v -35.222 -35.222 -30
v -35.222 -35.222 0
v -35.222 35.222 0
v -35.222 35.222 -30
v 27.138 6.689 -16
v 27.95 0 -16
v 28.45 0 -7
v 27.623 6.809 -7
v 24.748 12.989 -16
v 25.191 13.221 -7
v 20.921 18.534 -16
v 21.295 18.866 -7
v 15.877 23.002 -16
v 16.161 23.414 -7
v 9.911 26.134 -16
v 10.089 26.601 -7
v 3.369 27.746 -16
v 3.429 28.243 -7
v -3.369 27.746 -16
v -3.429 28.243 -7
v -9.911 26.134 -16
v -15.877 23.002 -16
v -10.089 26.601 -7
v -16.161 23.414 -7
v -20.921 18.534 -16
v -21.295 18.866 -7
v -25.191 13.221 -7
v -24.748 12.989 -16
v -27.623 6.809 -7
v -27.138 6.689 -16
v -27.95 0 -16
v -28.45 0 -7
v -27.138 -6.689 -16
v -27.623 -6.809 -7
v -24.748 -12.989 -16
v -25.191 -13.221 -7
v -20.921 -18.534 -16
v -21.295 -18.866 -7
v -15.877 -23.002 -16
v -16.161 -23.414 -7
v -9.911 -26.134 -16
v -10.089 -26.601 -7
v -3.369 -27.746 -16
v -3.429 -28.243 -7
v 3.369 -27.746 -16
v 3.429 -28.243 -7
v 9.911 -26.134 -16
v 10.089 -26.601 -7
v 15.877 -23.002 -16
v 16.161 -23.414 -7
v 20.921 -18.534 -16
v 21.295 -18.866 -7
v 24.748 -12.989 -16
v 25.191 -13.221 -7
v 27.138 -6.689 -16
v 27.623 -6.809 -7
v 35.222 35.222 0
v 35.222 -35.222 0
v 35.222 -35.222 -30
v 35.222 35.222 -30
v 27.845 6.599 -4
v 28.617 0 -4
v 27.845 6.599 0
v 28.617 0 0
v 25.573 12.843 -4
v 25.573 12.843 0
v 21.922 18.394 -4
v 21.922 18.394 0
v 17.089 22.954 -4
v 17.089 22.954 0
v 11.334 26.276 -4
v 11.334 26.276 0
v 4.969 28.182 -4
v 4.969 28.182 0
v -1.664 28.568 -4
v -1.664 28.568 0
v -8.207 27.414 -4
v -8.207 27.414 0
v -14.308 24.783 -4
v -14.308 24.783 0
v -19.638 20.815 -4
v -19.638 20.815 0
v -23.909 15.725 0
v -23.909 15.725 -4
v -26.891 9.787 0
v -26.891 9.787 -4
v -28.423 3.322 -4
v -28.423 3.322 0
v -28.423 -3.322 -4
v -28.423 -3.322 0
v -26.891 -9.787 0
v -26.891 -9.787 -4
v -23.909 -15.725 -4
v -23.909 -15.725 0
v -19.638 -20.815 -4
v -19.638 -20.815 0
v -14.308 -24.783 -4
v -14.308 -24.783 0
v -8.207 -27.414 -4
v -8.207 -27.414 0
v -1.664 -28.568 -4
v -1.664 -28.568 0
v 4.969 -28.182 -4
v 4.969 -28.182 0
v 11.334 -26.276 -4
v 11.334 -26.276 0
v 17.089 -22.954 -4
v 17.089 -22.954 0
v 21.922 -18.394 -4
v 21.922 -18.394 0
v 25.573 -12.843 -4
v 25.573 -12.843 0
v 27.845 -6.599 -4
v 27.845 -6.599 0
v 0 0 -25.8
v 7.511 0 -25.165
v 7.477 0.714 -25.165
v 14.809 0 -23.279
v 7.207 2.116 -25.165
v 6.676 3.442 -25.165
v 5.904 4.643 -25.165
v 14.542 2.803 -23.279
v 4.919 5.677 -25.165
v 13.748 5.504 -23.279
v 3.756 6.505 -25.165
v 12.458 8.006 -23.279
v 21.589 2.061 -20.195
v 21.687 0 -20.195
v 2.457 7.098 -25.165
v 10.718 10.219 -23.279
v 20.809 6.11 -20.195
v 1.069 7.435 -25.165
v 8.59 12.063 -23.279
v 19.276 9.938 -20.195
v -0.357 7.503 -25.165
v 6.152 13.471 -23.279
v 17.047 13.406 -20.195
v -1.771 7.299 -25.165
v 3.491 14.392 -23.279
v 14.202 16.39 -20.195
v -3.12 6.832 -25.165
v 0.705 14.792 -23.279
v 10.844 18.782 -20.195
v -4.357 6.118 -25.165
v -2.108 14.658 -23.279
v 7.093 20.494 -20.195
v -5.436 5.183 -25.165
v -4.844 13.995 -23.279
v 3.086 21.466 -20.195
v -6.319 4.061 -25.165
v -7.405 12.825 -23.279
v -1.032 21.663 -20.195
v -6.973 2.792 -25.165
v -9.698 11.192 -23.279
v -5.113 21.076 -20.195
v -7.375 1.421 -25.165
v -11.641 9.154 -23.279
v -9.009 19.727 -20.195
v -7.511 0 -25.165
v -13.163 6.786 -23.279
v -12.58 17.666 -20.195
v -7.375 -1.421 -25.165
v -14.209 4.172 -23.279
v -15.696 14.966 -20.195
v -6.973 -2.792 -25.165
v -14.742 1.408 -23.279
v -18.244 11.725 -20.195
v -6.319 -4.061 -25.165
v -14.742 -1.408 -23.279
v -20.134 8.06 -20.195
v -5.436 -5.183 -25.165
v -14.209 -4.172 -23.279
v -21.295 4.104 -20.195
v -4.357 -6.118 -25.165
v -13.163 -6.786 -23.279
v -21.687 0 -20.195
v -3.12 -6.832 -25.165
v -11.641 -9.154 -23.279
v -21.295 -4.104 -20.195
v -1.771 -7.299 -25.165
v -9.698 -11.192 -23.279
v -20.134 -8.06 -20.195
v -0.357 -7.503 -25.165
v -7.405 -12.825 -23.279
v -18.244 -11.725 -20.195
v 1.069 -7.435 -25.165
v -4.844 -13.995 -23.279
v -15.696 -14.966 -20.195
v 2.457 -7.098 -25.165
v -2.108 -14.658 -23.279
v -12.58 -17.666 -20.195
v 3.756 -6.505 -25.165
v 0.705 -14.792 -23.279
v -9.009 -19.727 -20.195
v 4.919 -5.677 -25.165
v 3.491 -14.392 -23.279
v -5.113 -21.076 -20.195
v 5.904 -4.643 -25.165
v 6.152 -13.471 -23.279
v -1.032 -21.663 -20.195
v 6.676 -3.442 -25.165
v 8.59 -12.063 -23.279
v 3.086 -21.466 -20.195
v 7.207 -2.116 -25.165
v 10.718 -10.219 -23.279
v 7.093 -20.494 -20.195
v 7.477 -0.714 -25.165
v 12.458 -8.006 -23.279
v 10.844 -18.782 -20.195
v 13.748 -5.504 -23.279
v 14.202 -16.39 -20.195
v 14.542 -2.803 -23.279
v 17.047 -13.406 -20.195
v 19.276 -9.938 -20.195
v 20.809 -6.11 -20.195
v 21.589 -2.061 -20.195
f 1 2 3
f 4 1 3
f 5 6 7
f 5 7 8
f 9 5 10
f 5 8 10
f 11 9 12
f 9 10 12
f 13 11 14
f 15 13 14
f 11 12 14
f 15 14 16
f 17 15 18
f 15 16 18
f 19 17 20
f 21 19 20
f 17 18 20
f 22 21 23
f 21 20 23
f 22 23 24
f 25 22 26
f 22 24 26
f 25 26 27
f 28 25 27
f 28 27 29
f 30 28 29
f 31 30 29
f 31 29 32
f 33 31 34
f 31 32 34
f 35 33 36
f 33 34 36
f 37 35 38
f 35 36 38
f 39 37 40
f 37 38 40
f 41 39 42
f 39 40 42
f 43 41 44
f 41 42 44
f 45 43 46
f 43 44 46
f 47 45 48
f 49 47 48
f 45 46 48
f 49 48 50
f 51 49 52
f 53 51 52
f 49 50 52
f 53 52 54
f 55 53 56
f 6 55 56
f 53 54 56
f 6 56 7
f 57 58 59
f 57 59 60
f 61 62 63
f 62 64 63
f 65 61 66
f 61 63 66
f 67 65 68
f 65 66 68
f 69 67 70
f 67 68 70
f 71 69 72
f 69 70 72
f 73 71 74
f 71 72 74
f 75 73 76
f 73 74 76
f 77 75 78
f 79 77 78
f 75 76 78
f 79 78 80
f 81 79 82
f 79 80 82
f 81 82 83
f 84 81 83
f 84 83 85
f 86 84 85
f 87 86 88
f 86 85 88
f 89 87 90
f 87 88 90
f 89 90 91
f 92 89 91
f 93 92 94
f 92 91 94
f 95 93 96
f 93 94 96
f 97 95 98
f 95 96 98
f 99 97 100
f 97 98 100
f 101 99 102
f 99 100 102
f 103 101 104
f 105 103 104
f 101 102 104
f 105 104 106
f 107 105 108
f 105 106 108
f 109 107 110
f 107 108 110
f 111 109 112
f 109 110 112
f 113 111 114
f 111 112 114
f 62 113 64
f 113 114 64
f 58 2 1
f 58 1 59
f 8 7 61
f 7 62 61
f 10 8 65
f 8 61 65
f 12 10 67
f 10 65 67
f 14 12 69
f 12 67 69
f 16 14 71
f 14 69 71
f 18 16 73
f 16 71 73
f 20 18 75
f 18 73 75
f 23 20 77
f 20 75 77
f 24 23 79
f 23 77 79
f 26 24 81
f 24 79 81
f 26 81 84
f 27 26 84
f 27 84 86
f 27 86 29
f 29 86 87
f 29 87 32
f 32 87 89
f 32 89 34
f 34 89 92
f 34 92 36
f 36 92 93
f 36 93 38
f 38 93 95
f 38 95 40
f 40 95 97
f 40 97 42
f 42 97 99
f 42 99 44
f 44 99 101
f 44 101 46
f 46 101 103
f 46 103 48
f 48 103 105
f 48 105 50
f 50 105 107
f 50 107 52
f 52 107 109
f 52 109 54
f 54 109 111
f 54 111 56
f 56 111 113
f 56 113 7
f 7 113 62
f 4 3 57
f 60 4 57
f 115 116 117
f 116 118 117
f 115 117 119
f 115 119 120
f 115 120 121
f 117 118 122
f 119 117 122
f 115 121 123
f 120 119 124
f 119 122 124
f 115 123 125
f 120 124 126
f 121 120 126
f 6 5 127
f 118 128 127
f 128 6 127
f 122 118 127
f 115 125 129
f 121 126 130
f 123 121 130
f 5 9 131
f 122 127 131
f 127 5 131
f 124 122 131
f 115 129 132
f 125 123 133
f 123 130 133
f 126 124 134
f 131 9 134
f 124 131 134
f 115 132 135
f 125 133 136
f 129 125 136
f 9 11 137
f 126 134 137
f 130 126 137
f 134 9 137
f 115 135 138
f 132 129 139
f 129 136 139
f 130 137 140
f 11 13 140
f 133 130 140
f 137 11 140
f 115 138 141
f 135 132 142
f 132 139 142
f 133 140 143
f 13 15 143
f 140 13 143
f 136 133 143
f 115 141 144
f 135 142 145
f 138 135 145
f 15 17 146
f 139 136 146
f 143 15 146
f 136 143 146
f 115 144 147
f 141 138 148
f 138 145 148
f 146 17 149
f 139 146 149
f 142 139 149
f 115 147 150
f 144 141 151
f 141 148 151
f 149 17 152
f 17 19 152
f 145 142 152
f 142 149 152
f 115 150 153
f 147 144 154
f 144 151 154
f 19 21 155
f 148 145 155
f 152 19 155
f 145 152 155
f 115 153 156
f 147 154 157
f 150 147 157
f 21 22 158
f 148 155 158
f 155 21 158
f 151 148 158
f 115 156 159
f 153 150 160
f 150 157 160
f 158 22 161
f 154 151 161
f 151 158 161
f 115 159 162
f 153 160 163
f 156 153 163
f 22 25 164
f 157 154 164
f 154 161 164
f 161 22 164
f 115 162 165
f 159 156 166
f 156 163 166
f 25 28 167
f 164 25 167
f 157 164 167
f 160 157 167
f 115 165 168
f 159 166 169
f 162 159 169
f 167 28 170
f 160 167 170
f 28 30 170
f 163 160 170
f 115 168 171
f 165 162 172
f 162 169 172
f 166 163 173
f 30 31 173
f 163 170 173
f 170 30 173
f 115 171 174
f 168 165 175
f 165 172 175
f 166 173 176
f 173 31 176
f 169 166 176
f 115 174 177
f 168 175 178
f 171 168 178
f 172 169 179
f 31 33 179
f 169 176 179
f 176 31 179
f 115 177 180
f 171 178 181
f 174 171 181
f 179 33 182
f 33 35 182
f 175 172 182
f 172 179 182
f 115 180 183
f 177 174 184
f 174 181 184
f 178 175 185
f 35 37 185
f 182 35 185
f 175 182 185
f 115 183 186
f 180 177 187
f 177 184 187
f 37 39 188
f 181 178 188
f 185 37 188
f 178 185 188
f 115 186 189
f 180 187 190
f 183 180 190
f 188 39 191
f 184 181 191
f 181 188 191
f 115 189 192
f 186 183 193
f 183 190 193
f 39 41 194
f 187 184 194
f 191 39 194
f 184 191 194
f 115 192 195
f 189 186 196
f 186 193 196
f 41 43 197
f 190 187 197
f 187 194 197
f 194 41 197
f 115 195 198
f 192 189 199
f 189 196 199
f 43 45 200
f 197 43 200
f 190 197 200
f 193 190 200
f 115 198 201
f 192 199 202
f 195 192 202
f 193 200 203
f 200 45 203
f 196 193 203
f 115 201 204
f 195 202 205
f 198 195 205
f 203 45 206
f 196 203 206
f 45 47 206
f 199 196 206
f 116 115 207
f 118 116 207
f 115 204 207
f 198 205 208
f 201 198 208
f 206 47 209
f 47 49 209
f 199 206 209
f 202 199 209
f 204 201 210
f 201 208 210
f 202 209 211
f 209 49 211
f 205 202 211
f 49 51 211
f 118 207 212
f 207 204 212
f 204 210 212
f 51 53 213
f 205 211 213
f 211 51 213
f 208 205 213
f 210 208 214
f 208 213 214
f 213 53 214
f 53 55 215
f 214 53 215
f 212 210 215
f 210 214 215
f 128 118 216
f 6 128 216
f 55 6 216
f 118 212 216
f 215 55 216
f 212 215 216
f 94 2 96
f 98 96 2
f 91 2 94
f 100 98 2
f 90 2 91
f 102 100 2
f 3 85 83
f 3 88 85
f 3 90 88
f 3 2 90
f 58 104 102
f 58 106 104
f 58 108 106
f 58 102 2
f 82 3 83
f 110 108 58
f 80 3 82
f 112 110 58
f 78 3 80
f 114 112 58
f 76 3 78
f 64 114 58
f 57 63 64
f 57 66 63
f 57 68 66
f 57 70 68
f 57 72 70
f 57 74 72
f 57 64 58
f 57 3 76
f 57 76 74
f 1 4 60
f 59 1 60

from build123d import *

# Parameters (mm, degrees)
F0_W     = 70.443585515
F0_H     = 70.443585515
F1_DEPTH = 30


# Not quite as in the source:
# - a feature names something its author has since deleted; it is built from what else it names


with BuildPart() as f1:
    # F0 (on Top) → F1 (new body)
    with BuildSketch(Plane.XY):
        Rectangle(F0_W, F0_H)
    extrude(amount=-F1_DEPTH)

    # F2 (on Front) → F3 (revolve, cut)
    with BuildSketch(Plane.XZ):
        with BuildLine():
            Line((0, -7), (0, -16))
            Line((0, -16), (0, -25.8))
            ThreePointArc((0, -25.8), (14.8091399143, -23.279001082), (27.95, -16))
            Line((27.95, -16), (28.45, -7))
            Line((28.45, -7), (28.6166666667, -4))
            Line((28.6166666667, -4), (28.6166666667, 0))
            Line((28.6166666667, 0), (0, 0))
            Line((0, 0), (0, -4))
            Line((0, -4), (0, -7))
        make_face()
    revolve(axis=Axis((0, 0, -11.5), (0, 0, 1)), mode=Mode.SUBTRACT)


solid = f1.part
